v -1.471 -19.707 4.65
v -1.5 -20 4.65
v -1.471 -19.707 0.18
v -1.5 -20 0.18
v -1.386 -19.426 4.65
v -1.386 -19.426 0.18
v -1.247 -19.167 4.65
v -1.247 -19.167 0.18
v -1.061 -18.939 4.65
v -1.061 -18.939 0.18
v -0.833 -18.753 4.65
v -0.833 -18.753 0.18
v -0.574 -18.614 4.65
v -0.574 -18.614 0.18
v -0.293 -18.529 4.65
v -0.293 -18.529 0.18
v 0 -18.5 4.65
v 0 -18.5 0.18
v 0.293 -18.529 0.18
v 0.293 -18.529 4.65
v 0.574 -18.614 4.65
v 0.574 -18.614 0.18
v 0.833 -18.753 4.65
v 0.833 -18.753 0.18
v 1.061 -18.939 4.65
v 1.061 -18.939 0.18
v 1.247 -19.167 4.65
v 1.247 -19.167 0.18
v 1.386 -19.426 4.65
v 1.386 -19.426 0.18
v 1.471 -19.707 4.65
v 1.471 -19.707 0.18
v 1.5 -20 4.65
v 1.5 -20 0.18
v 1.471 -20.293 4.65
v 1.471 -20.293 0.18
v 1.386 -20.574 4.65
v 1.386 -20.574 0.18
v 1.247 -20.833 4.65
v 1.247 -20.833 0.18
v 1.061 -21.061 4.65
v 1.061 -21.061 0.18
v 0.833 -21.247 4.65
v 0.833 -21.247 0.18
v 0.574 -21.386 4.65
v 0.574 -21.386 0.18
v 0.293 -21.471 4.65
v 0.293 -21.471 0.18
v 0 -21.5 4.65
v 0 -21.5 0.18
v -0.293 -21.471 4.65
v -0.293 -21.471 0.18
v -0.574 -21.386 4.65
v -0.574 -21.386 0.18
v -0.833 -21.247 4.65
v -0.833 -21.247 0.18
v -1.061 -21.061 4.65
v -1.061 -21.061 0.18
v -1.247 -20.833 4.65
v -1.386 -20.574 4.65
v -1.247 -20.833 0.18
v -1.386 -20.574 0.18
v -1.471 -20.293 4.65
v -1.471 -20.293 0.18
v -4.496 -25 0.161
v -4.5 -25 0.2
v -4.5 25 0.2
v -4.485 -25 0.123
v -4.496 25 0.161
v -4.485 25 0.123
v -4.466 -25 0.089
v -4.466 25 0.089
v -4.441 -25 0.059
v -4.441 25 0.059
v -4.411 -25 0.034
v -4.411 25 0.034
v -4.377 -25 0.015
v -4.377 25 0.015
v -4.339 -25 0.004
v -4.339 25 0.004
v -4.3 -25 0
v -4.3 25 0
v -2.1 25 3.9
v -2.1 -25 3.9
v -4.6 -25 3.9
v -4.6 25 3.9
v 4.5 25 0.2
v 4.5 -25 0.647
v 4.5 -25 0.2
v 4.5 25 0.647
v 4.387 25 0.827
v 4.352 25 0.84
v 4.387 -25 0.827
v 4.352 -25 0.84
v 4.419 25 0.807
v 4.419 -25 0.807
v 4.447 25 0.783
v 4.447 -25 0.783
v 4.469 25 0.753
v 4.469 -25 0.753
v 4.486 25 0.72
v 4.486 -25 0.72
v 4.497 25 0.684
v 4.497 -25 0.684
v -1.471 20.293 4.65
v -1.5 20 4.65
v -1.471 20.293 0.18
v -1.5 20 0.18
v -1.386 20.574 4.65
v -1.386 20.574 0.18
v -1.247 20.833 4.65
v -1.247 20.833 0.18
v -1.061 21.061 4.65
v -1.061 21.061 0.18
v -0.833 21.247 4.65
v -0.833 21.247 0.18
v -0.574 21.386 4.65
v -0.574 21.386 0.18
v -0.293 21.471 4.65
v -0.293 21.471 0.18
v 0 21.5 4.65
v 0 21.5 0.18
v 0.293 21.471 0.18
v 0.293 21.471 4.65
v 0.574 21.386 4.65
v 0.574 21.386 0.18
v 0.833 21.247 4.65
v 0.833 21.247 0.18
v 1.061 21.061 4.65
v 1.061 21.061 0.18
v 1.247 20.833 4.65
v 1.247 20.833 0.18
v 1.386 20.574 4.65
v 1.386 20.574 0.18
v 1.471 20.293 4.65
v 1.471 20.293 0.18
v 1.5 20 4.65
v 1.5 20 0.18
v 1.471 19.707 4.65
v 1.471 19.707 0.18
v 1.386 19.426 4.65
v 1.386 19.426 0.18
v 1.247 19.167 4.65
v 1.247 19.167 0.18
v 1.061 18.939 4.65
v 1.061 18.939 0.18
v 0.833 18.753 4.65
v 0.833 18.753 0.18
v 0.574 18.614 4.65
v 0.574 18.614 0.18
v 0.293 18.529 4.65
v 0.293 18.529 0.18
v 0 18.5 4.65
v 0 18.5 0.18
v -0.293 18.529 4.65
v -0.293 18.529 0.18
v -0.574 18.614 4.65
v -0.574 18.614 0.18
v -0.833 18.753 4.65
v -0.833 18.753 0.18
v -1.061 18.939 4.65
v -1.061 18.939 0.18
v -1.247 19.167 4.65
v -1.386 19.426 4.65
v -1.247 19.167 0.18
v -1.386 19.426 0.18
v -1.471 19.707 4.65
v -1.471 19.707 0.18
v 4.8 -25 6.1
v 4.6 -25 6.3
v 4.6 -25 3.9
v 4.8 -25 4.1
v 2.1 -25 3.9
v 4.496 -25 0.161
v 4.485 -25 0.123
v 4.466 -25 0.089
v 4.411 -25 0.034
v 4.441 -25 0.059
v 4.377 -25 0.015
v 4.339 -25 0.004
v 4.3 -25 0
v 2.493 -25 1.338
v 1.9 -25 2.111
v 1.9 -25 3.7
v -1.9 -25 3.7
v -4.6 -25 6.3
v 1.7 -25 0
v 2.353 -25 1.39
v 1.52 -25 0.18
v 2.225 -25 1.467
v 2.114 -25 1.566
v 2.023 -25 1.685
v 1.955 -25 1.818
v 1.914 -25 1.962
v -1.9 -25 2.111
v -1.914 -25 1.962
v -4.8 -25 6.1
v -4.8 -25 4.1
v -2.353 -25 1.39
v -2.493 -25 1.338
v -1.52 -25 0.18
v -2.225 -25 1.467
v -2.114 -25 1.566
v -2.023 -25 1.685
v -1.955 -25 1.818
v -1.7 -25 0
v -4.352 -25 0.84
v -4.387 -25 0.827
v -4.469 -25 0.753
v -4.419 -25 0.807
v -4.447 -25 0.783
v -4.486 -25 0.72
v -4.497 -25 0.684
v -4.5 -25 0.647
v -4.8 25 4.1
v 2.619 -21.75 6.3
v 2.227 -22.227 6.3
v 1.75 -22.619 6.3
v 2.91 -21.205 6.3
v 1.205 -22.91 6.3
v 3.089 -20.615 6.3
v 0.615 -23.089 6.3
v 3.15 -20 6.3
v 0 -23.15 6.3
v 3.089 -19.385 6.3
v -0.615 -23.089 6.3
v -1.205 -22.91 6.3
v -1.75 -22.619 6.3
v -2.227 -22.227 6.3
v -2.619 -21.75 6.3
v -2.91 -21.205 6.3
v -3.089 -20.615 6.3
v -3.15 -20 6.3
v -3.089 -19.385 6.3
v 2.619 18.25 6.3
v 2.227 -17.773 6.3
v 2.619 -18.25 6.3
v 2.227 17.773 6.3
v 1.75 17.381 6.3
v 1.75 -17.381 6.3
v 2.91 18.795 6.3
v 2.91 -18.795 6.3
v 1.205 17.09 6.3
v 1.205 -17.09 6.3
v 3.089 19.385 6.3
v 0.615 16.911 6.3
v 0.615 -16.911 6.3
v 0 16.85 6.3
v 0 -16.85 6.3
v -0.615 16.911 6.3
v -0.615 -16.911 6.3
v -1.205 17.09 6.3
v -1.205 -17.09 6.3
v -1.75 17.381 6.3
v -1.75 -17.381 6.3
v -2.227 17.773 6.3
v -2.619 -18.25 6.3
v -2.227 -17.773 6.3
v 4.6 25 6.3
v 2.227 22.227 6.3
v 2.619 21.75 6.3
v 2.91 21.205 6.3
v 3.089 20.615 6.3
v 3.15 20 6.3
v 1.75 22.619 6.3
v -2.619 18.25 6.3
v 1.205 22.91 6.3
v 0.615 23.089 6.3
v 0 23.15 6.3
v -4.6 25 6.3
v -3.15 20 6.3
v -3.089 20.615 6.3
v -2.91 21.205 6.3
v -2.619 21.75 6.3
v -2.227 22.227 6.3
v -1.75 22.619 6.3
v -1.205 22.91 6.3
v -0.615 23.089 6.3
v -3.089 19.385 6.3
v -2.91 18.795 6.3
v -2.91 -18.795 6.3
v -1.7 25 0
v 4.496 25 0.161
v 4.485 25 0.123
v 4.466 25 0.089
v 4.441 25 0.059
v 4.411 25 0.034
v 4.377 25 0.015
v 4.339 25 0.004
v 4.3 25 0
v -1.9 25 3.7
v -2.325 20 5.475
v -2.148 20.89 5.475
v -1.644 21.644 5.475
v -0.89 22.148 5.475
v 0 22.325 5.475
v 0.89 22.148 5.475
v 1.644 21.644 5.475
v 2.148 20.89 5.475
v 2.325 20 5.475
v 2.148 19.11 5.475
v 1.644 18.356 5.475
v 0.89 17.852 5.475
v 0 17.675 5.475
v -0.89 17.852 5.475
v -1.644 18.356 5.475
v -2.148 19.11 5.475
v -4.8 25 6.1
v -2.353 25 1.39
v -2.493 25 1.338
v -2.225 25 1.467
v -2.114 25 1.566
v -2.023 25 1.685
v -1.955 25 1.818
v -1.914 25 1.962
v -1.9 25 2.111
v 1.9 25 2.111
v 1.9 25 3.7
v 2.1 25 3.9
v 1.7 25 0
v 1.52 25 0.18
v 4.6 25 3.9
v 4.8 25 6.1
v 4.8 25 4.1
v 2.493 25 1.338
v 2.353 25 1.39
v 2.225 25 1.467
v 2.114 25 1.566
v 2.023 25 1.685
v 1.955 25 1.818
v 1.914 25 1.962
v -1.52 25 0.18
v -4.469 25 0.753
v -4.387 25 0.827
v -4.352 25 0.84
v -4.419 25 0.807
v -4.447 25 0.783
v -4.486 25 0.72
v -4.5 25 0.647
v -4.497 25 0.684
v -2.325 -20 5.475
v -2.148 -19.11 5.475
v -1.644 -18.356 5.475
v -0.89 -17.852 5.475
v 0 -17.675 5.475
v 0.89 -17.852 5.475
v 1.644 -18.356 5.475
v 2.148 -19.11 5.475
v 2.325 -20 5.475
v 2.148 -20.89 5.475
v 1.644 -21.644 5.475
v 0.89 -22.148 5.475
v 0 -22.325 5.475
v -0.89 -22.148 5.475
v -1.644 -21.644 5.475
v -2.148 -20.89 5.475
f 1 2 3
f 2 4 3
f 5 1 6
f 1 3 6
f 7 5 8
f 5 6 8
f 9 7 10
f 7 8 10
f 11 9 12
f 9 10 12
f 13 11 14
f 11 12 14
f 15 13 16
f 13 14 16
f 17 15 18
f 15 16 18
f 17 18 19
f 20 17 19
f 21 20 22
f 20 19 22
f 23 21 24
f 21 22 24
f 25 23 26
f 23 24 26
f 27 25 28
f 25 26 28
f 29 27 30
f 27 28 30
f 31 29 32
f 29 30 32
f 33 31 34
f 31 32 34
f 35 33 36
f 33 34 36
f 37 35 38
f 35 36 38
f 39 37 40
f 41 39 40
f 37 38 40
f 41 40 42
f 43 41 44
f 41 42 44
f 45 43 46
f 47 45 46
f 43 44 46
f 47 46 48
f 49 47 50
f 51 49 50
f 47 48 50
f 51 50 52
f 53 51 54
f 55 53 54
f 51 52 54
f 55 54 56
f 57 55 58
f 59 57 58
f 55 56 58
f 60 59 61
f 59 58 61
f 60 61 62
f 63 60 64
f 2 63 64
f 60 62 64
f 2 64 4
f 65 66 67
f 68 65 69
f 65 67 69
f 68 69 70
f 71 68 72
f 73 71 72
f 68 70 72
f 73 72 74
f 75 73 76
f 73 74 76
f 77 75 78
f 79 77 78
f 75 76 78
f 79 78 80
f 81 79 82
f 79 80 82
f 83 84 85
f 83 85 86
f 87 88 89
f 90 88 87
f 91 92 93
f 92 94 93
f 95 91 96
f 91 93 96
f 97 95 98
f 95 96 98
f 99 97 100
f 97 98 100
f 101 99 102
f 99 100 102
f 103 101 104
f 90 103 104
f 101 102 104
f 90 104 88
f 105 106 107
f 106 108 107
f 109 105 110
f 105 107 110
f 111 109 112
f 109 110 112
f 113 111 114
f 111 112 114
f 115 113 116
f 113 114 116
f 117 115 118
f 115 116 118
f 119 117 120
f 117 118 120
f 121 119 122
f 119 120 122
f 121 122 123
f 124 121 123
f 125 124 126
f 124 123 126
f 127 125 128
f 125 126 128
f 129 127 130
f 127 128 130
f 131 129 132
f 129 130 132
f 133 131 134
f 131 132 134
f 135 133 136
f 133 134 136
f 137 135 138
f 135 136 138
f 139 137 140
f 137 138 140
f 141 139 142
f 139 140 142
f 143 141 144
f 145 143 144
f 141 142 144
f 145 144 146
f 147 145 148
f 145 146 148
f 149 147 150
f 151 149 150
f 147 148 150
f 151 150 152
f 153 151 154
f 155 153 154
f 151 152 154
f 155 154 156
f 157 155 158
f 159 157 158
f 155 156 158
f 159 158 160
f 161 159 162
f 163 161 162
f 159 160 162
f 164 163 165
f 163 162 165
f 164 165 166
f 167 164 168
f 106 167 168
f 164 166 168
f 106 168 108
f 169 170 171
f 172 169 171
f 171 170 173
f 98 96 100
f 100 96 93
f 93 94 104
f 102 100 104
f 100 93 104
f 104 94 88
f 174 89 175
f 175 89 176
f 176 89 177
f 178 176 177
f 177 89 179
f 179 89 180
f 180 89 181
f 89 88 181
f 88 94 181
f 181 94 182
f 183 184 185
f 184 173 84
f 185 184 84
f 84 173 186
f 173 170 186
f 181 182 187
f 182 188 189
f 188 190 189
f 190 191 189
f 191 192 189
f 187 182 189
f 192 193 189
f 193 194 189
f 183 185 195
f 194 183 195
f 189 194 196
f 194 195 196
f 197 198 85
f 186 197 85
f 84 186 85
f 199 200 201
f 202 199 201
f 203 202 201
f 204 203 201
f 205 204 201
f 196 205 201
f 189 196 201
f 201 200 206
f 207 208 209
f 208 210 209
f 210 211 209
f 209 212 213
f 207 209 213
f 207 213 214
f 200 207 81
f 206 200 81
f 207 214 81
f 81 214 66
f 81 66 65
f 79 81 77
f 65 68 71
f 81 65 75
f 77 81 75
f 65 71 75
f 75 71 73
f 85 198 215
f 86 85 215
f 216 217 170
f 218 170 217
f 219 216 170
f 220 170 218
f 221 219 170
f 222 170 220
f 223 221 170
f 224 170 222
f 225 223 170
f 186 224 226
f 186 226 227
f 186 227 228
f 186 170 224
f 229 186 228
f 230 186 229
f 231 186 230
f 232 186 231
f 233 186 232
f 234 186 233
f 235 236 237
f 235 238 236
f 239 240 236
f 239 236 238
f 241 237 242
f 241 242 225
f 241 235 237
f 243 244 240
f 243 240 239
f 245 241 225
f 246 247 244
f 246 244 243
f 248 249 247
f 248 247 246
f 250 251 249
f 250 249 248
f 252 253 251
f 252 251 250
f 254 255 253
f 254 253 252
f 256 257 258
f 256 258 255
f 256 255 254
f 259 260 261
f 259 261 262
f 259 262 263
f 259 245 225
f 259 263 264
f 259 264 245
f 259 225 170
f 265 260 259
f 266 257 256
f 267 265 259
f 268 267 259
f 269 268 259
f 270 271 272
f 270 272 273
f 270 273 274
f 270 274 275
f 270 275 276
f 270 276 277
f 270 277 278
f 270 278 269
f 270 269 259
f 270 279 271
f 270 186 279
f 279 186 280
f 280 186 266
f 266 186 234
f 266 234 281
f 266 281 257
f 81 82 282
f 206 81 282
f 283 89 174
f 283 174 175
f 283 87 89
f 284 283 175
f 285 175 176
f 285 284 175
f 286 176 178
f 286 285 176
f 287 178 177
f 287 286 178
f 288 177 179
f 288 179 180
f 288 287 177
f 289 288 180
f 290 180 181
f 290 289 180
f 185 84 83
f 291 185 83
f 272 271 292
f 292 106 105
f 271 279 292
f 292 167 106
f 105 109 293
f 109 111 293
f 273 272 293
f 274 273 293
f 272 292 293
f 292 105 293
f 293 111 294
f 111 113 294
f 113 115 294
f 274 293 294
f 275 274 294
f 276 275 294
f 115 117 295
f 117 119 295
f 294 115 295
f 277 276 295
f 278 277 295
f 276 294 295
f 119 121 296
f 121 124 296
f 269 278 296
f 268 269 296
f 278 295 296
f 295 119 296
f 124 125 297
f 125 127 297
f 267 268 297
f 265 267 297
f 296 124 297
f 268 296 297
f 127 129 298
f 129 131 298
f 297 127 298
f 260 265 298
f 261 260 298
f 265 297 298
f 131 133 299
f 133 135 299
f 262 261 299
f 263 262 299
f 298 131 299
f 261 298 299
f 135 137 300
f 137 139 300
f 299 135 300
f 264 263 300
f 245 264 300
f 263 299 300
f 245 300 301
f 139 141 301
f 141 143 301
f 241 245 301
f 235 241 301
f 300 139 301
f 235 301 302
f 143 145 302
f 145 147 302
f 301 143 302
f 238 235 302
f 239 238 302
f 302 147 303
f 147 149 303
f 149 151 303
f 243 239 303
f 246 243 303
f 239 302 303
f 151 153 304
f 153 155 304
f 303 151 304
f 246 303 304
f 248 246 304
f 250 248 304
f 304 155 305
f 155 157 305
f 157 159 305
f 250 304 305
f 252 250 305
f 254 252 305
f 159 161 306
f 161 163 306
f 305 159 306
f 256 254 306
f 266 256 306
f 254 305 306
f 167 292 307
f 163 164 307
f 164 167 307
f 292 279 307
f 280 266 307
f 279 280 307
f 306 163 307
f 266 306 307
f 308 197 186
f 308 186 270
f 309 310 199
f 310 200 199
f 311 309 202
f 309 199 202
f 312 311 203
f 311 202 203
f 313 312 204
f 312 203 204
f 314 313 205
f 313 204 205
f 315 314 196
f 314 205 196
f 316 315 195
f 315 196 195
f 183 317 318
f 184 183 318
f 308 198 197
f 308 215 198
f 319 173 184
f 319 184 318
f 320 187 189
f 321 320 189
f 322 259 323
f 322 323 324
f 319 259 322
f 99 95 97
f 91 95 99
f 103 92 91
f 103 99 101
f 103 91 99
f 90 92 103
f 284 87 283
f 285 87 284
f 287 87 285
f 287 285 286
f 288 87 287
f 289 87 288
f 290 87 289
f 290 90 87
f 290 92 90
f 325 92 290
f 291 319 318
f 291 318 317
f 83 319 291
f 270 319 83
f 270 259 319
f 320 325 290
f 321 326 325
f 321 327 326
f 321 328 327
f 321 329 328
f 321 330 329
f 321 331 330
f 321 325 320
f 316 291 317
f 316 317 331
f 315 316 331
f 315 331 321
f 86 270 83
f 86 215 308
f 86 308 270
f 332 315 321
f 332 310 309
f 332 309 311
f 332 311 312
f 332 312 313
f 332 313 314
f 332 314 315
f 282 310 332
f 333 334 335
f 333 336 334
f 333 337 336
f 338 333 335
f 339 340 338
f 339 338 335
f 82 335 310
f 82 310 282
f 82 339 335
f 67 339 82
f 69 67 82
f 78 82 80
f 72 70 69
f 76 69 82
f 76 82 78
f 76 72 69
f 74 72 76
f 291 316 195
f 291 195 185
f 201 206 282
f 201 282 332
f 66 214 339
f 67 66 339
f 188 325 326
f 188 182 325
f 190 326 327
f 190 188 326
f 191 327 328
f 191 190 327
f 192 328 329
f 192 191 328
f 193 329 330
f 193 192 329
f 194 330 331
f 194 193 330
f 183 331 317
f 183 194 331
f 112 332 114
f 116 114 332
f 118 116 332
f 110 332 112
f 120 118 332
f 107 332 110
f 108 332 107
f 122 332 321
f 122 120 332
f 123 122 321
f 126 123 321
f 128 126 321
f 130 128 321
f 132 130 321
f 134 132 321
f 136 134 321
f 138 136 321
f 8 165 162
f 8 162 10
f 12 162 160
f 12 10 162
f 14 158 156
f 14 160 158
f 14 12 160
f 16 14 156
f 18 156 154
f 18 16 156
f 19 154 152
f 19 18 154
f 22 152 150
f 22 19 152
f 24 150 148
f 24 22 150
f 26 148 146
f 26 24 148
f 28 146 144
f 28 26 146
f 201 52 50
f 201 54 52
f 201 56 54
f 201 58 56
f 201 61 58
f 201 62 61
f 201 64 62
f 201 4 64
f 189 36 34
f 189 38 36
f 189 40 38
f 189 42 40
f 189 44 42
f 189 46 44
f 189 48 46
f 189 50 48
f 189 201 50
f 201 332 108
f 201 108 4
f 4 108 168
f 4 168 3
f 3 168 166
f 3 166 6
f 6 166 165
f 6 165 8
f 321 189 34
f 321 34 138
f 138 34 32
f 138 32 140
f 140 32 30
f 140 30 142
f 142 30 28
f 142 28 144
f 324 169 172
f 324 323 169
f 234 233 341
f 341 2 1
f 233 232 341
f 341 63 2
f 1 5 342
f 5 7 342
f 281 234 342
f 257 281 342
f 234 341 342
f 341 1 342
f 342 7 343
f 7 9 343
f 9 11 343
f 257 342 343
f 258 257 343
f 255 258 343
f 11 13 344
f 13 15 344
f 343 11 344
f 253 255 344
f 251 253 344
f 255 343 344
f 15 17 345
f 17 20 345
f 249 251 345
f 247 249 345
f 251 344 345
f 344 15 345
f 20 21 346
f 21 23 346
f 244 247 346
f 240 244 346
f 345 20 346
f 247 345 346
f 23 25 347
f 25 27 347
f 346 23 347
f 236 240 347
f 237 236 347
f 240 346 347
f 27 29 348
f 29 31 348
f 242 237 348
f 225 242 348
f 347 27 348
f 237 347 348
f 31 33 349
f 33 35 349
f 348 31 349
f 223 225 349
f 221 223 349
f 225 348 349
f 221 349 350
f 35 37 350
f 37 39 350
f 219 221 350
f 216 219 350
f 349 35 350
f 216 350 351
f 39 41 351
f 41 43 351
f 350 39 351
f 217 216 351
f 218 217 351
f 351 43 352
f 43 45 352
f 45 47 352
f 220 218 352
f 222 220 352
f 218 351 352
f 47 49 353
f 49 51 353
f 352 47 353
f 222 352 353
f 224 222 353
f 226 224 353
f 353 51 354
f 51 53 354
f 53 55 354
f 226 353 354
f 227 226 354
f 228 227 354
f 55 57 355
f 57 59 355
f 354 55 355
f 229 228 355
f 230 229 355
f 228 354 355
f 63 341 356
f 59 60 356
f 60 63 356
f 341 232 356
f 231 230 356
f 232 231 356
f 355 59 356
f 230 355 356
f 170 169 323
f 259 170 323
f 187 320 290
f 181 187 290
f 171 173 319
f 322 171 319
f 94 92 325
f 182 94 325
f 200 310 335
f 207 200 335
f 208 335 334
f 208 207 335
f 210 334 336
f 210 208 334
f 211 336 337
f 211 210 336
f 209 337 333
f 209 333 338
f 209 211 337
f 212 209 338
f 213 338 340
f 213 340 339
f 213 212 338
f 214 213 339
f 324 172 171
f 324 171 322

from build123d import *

# Parameters (mm, degrees)
ESQUISSE1_W                                    = 9
ESQUISSE1_H                                    = 50
BOSS_EXTRU_1_DEPTH                             = 6.3
ESQUISSE2_W                                    = 2.6
ESQUISSE2_H                                    = 5.499999997
ENL_V_MAT_EXTRU_1_DEPTH                        = 51.595849632
ESQUISSE3_W                                    = 2.4
ESQUISSE3_H                                    = 50
BOSS_EXTRU_2_DEPTH                             = 2.9
ESQUISSE4_W                                    = 2.6
ESQUISSE4_H                                    = 4.803332101
ENL_V_MAT_EXTRU_2_DEPTH                        = 51.623413555
ESQUISSE5_W                                    = 2.4
ESQUISSE5_H                                    = 50
BOSS_EXTRU_3_DEPTH                             = 2.9
ESQUISSE6_W                                    = 3.04
ESQUISSE6_H                                    = 0.18
ENL_V_MAT_EXTRU_3_DEPTH                        = 51.623413555
D_POUILLE1_ANGLE                               = 14.999999904
D_POUILLE2_ANGLE                               = 14.999999904
D_POUILLE3_ANGLE                               = 45
FRAISAGE_POUR_VIS_T_TE_FRAIS_E_M31_D           = 3
FRAISAGE_POUR_VIS_T_TE_FRAIS_E_M31_CSINK_D     = 6.3
FRAISAGE_POUR_VIS_T_TE_FRAIS_E_M31_CSINK_ANGLE = 90
CHANFREIN1_SIZE                                = 0.2
CONG_1_R                                       = 0.2
CONG_2_R                                       = 0.8


with BuildPart() as part:
    # Esquisse1 → Boss.-Extru.1 (new body)
    with BuildSketch(Plane.XY.offset(6.3)):
        Rectangle(ESQUISSE1_W, ESQUISSE1_H)
    extrude(amount=-BOSS_EXTRU_1_DEPTH)

    # Esquisse2 → Enlèv. mat.-Extru.1 (cut, through all)
    with BuildSketch(Plane(origin=(0, 25, 0), x_dir=(-1, 0, 0), z_dir=(0, 1, 0))):
        with Locations((3.2, 3.550000002)):
            Rectangle(ESQUISSE2_W, ESQUISSE2_H)
    extrude(amount=-ENL_V_MAT_EXTRU_1_DEPTH, mode=Mode.SUBTRACT)

    # Esquisse3 → Boss.-Extru.2 (add)
    with BuildSketch(Plane.ZY.offset(1.9)):
        with Locations((5.1, 0)):
            Rectangle(ESQUISSE3_W, ESQUISSE3_H)
    extrude(amount=BOSS_EXTRU_2_DEPTH)

    # Esquisse4 → Enlèv. mat.-Extru.2 (cut, through all)
    with BuildSketch(Plane(origin=(0, 25, 0), x_dir=(-1, 0, 0), z_dir=(0, 1, 0))):
        with Locations((-3.2, 3.89833395)):
            Rectangle(ESQUISSE4_W, ESQUISSE4_H)
    extrude(amount=-ENL_V_MAT_EXTRU_2_DEPTH, mode=Mode.SUBTRACT)

    # Esquisse5 → Boss.-Extru.3 (add)
    with BuildSketch(Plane(origin=(1.9, 0, 0), x_dir=(0, 0, -1), z_dir=(1, 0, 0))):
        with Locations((-5.1, 0)):
            Rectangle(ESQUISSE5_W, ESQUISSE5_H)
    extrude(amount=BOSS_EXTRU_3_DEPTH)

    # Esquisse6 → Enlèv. mat.-Extru.3 (cut, through all)
    with BuildSketch(Plane.XZ.offset(25)):
        with Locations((0, 0.09)):
            Rectangle(ESQUISSE6_W, ESQUISSE6_H)
    extrude(amount=-ENL_V_MAT_EXTRU_3_DEPTH, mode=Mode.SUBTRACT)

    # Dépouille1
    d_pouille1_faces = [part.faces().sort_by_distance(p)[0] for p in [
        (-3.2, 0, 0.800000003),
    ]]
    draft(d_pouille1_faces, Plane(origin=(-4.5, 25, 0), x_dir=(0, -1, 0), z_dir=(-1, 0, 0)), D_POUILLE1_ANGLE)

    # Dépouille2
    d_pouille2_faces = [part.faces().sort_by_distance(p)[0] for p in [
        (3.2, 0, 1.496667899),
    ]]
    draft(d_pouille2_faces, Plane(origin=(1.9, -25, 1.496667899), x_dir=(0, 0, 1), z_dir=(1, 0, 0)), D_POUILLE2_ANGLE)

    # Dépouille3
    d_pouille3_faces = [part.faces().sort_by_distance(p)[0] for p in [
        (-1.52, 0, 0.09),
        (1.52, 0, 0.09),
    ]]
    draft(d_pouille3_faces, Plane(origin=(1.52, 25, 0.18), x_dir=(-1, 0, 0), z_dir=(0, 0, -1)), D_POUILLE3_ANGLE)

    # Fraisage pour vis à tête fraisée M31 (through all)
    with Locations(Plane.XY.offset(6.3)):
        with Locations((0, 20), (0, -20)):
            CounterSinkHole(FRAISAGE_POUR_VIS_T_TE_FRAIS_E_M31_D / 2, FRAISAGE_POUR_VIS_T_TE_FRAIS_E_M31_CSINK_D / 2, counter_sink_angle=FRAISAGE_POUR_VIS_T_TE_FRAIS_E_M31_CSINK_ANGLE)

    # Chanfrein1
    chanfrein1_edges = [part.edges().sort_by_distance(p)[0] for p in [
        (-1.9, 0, 3.9),
        (-4.8, 0, 6.3),
        (-4.8, 0, 3.9),
        (1.9, 0, 3.9),
        (4.8, 0, 3.9),
        (4.8, 0, 6.3),
    ]]
    chamfer(chanfrein1_edges, length=CHANFREIN1_SIZE)

    # Congé1
    cong_1_edges = [part.edges().sort_by_distance(p)[0] for p in [
        (-4.5, 0, 0),
        (-4.5, 0, 0.800000003),
        (4.5, 0, 0),
        (4.5, 0, 0.800000003),
    ]]
    fillet(cong_1_edges, radius=CONG_1_R)

    # Congé2
    cong_2_edges = [part.edges().sort_by_distance(p)[0] for p in [
        (-1.9, 0, 1.496667899),
        (1.9, 0, 1.496667899),
    ]]
    fillet(cong_2_edges, radius=CONG_2_R)


solid = part.part
